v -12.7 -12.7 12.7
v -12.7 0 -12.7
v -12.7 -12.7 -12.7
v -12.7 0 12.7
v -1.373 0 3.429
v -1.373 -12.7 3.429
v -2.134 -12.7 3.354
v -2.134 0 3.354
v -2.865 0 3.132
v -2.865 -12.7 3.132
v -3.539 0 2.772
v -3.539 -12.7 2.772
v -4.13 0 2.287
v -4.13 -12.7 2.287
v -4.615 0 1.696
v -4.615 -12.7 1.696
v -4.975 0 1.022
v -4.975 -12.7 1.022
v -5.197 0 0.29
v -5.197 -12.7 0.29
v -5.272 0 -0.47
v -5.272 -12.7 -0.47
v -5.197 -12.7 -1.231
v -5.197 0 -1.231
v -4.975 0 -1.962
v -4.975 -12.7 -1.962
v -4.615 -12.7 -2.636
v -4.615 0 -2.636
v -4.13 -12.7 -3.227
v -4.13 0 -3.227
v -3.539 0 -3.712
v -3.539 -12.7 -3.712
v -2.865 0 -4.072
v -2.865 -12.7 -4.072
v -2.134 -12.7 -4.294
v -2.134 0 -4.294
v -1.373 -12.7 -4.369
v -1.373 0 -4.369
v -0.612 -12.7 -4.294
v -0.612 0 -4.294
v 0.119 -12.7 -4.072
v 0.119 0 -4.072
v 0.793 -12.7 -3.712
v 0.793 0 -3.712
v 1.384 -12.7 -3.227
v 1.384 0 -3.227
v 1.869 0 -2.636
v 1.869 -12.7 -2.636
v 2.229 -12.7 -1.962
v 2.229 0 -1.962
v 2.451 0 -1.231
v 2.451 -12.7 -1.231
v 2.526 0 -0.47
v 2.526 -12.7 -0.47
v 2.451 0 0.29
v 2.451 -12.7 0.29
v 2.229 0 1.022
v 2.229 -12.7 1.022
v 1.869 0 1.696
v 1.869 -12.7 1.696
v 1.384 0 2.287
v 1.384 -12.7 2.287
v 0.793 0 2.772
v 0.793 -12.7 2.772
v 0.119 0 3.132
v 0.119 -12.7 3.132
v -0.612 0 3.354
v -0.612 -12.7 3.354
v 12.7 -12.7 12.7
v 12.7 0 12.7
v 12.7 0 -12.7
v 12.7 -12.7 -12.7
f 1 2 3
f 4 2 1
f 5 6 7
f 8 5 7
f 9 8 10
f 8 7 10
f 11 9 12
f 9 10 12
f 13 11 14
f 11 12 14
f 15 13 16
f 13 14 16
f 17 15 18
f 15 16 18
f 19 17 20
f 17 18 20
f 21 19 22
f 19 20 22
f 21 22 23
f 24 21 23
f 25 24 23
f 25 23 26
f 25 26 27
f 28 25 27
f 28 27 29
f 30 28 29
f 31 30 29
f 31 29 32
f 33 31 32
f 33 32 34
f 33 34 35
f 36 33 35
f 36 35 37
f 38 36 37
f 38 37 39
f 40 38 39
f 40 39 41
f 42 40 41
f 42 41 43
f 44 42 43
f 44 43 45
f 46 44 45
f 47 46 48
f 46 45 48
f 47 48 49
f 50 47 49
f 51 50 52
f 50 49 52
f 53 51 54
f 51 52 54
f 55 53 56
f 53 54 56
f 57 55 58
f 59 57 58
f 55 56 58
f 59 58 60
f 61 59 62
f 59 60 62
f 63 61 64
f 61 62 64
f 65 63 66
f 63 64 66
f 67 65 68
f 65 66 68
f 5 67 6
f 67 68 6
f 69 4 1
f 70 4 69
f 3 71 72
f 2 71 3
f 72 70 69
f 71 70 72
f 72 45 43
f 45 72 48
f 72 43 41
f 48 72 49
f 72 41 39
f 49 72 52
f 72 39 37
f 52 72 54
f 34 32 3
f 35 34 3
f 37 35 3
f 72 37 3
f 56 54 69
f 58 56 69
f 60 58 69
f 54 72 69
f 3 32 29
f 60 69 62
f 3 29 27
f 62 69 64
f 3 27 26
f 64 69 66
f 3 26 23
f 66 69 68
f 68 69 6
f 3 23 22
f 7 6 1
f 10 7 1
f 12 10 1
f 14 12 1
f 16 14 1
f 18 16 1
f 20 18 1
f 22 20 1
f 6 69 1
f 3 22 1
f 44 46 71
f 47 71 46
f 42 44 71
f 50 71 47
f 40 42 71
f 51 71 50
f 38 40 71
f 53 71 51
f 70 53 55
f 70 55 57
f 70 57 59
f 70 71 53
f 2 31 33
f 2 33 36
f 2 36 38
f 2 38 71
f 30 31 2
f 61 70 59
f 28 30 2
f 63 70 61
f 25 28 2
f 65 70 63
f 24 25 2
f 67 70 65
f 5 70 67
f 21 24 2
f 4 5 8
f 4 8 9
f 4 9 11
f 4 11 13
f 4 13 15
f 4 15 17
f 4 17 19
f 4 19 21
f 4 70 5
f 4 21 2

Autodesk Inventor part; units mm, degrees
ref_plane "YZ Plane" through (0, 0, 0) normal (1, 0, 0) x (0, 1, 0)
ref_plane "XZ Plane" through (0, 0, 0) normal (0, 1, 0) x (-1, 0, 0)
ref_plane "XY Plane" through (0, 0, 0) normal (0, 0, 1) x (1, 0, 0)
sketch "Sketch1" plane through (0, 0, 0) normal (0, 1, 0) x (-1, 0, 0)
  line L0 (-12.7, 12.7) -> (-12.7, -12.7)
  line L1 (-12.7, -12.7) -> (12.7, -12.7)
  line L2 (12.7, -12.7) -> (12.7, 12.7)
  line L3 (12.7, 12.7) -> (-12.7, 12.7)
  line L4 (-12.7, 12.7) -> (12.7, -12.7) construction
  line L5 (-12.7, -12.7) -> (12.7, 12.7) construction
  point P0 (0, 0)
  dimension "d0" = 25.4
extrude "Extrusion1" add sketch "Sketch1" against normal blind 12.7
sketch "Sketch3" plane through (0, 0, 0) normal (0, 1, 0) x (1, 0, 0)
  point P0 (0, 0)
  point P1 (-1.3731, 0.4703)
hole "Hole2" at (-1.3731, 0, -0.4703) direction (0, -1, 0) diameter 7.7978 end through all
thread "Thread3" size "5/16-18 UNC" class "2B" standard "ANSI Unified Screw Threads" full length
properties part number "_3DPrint"
